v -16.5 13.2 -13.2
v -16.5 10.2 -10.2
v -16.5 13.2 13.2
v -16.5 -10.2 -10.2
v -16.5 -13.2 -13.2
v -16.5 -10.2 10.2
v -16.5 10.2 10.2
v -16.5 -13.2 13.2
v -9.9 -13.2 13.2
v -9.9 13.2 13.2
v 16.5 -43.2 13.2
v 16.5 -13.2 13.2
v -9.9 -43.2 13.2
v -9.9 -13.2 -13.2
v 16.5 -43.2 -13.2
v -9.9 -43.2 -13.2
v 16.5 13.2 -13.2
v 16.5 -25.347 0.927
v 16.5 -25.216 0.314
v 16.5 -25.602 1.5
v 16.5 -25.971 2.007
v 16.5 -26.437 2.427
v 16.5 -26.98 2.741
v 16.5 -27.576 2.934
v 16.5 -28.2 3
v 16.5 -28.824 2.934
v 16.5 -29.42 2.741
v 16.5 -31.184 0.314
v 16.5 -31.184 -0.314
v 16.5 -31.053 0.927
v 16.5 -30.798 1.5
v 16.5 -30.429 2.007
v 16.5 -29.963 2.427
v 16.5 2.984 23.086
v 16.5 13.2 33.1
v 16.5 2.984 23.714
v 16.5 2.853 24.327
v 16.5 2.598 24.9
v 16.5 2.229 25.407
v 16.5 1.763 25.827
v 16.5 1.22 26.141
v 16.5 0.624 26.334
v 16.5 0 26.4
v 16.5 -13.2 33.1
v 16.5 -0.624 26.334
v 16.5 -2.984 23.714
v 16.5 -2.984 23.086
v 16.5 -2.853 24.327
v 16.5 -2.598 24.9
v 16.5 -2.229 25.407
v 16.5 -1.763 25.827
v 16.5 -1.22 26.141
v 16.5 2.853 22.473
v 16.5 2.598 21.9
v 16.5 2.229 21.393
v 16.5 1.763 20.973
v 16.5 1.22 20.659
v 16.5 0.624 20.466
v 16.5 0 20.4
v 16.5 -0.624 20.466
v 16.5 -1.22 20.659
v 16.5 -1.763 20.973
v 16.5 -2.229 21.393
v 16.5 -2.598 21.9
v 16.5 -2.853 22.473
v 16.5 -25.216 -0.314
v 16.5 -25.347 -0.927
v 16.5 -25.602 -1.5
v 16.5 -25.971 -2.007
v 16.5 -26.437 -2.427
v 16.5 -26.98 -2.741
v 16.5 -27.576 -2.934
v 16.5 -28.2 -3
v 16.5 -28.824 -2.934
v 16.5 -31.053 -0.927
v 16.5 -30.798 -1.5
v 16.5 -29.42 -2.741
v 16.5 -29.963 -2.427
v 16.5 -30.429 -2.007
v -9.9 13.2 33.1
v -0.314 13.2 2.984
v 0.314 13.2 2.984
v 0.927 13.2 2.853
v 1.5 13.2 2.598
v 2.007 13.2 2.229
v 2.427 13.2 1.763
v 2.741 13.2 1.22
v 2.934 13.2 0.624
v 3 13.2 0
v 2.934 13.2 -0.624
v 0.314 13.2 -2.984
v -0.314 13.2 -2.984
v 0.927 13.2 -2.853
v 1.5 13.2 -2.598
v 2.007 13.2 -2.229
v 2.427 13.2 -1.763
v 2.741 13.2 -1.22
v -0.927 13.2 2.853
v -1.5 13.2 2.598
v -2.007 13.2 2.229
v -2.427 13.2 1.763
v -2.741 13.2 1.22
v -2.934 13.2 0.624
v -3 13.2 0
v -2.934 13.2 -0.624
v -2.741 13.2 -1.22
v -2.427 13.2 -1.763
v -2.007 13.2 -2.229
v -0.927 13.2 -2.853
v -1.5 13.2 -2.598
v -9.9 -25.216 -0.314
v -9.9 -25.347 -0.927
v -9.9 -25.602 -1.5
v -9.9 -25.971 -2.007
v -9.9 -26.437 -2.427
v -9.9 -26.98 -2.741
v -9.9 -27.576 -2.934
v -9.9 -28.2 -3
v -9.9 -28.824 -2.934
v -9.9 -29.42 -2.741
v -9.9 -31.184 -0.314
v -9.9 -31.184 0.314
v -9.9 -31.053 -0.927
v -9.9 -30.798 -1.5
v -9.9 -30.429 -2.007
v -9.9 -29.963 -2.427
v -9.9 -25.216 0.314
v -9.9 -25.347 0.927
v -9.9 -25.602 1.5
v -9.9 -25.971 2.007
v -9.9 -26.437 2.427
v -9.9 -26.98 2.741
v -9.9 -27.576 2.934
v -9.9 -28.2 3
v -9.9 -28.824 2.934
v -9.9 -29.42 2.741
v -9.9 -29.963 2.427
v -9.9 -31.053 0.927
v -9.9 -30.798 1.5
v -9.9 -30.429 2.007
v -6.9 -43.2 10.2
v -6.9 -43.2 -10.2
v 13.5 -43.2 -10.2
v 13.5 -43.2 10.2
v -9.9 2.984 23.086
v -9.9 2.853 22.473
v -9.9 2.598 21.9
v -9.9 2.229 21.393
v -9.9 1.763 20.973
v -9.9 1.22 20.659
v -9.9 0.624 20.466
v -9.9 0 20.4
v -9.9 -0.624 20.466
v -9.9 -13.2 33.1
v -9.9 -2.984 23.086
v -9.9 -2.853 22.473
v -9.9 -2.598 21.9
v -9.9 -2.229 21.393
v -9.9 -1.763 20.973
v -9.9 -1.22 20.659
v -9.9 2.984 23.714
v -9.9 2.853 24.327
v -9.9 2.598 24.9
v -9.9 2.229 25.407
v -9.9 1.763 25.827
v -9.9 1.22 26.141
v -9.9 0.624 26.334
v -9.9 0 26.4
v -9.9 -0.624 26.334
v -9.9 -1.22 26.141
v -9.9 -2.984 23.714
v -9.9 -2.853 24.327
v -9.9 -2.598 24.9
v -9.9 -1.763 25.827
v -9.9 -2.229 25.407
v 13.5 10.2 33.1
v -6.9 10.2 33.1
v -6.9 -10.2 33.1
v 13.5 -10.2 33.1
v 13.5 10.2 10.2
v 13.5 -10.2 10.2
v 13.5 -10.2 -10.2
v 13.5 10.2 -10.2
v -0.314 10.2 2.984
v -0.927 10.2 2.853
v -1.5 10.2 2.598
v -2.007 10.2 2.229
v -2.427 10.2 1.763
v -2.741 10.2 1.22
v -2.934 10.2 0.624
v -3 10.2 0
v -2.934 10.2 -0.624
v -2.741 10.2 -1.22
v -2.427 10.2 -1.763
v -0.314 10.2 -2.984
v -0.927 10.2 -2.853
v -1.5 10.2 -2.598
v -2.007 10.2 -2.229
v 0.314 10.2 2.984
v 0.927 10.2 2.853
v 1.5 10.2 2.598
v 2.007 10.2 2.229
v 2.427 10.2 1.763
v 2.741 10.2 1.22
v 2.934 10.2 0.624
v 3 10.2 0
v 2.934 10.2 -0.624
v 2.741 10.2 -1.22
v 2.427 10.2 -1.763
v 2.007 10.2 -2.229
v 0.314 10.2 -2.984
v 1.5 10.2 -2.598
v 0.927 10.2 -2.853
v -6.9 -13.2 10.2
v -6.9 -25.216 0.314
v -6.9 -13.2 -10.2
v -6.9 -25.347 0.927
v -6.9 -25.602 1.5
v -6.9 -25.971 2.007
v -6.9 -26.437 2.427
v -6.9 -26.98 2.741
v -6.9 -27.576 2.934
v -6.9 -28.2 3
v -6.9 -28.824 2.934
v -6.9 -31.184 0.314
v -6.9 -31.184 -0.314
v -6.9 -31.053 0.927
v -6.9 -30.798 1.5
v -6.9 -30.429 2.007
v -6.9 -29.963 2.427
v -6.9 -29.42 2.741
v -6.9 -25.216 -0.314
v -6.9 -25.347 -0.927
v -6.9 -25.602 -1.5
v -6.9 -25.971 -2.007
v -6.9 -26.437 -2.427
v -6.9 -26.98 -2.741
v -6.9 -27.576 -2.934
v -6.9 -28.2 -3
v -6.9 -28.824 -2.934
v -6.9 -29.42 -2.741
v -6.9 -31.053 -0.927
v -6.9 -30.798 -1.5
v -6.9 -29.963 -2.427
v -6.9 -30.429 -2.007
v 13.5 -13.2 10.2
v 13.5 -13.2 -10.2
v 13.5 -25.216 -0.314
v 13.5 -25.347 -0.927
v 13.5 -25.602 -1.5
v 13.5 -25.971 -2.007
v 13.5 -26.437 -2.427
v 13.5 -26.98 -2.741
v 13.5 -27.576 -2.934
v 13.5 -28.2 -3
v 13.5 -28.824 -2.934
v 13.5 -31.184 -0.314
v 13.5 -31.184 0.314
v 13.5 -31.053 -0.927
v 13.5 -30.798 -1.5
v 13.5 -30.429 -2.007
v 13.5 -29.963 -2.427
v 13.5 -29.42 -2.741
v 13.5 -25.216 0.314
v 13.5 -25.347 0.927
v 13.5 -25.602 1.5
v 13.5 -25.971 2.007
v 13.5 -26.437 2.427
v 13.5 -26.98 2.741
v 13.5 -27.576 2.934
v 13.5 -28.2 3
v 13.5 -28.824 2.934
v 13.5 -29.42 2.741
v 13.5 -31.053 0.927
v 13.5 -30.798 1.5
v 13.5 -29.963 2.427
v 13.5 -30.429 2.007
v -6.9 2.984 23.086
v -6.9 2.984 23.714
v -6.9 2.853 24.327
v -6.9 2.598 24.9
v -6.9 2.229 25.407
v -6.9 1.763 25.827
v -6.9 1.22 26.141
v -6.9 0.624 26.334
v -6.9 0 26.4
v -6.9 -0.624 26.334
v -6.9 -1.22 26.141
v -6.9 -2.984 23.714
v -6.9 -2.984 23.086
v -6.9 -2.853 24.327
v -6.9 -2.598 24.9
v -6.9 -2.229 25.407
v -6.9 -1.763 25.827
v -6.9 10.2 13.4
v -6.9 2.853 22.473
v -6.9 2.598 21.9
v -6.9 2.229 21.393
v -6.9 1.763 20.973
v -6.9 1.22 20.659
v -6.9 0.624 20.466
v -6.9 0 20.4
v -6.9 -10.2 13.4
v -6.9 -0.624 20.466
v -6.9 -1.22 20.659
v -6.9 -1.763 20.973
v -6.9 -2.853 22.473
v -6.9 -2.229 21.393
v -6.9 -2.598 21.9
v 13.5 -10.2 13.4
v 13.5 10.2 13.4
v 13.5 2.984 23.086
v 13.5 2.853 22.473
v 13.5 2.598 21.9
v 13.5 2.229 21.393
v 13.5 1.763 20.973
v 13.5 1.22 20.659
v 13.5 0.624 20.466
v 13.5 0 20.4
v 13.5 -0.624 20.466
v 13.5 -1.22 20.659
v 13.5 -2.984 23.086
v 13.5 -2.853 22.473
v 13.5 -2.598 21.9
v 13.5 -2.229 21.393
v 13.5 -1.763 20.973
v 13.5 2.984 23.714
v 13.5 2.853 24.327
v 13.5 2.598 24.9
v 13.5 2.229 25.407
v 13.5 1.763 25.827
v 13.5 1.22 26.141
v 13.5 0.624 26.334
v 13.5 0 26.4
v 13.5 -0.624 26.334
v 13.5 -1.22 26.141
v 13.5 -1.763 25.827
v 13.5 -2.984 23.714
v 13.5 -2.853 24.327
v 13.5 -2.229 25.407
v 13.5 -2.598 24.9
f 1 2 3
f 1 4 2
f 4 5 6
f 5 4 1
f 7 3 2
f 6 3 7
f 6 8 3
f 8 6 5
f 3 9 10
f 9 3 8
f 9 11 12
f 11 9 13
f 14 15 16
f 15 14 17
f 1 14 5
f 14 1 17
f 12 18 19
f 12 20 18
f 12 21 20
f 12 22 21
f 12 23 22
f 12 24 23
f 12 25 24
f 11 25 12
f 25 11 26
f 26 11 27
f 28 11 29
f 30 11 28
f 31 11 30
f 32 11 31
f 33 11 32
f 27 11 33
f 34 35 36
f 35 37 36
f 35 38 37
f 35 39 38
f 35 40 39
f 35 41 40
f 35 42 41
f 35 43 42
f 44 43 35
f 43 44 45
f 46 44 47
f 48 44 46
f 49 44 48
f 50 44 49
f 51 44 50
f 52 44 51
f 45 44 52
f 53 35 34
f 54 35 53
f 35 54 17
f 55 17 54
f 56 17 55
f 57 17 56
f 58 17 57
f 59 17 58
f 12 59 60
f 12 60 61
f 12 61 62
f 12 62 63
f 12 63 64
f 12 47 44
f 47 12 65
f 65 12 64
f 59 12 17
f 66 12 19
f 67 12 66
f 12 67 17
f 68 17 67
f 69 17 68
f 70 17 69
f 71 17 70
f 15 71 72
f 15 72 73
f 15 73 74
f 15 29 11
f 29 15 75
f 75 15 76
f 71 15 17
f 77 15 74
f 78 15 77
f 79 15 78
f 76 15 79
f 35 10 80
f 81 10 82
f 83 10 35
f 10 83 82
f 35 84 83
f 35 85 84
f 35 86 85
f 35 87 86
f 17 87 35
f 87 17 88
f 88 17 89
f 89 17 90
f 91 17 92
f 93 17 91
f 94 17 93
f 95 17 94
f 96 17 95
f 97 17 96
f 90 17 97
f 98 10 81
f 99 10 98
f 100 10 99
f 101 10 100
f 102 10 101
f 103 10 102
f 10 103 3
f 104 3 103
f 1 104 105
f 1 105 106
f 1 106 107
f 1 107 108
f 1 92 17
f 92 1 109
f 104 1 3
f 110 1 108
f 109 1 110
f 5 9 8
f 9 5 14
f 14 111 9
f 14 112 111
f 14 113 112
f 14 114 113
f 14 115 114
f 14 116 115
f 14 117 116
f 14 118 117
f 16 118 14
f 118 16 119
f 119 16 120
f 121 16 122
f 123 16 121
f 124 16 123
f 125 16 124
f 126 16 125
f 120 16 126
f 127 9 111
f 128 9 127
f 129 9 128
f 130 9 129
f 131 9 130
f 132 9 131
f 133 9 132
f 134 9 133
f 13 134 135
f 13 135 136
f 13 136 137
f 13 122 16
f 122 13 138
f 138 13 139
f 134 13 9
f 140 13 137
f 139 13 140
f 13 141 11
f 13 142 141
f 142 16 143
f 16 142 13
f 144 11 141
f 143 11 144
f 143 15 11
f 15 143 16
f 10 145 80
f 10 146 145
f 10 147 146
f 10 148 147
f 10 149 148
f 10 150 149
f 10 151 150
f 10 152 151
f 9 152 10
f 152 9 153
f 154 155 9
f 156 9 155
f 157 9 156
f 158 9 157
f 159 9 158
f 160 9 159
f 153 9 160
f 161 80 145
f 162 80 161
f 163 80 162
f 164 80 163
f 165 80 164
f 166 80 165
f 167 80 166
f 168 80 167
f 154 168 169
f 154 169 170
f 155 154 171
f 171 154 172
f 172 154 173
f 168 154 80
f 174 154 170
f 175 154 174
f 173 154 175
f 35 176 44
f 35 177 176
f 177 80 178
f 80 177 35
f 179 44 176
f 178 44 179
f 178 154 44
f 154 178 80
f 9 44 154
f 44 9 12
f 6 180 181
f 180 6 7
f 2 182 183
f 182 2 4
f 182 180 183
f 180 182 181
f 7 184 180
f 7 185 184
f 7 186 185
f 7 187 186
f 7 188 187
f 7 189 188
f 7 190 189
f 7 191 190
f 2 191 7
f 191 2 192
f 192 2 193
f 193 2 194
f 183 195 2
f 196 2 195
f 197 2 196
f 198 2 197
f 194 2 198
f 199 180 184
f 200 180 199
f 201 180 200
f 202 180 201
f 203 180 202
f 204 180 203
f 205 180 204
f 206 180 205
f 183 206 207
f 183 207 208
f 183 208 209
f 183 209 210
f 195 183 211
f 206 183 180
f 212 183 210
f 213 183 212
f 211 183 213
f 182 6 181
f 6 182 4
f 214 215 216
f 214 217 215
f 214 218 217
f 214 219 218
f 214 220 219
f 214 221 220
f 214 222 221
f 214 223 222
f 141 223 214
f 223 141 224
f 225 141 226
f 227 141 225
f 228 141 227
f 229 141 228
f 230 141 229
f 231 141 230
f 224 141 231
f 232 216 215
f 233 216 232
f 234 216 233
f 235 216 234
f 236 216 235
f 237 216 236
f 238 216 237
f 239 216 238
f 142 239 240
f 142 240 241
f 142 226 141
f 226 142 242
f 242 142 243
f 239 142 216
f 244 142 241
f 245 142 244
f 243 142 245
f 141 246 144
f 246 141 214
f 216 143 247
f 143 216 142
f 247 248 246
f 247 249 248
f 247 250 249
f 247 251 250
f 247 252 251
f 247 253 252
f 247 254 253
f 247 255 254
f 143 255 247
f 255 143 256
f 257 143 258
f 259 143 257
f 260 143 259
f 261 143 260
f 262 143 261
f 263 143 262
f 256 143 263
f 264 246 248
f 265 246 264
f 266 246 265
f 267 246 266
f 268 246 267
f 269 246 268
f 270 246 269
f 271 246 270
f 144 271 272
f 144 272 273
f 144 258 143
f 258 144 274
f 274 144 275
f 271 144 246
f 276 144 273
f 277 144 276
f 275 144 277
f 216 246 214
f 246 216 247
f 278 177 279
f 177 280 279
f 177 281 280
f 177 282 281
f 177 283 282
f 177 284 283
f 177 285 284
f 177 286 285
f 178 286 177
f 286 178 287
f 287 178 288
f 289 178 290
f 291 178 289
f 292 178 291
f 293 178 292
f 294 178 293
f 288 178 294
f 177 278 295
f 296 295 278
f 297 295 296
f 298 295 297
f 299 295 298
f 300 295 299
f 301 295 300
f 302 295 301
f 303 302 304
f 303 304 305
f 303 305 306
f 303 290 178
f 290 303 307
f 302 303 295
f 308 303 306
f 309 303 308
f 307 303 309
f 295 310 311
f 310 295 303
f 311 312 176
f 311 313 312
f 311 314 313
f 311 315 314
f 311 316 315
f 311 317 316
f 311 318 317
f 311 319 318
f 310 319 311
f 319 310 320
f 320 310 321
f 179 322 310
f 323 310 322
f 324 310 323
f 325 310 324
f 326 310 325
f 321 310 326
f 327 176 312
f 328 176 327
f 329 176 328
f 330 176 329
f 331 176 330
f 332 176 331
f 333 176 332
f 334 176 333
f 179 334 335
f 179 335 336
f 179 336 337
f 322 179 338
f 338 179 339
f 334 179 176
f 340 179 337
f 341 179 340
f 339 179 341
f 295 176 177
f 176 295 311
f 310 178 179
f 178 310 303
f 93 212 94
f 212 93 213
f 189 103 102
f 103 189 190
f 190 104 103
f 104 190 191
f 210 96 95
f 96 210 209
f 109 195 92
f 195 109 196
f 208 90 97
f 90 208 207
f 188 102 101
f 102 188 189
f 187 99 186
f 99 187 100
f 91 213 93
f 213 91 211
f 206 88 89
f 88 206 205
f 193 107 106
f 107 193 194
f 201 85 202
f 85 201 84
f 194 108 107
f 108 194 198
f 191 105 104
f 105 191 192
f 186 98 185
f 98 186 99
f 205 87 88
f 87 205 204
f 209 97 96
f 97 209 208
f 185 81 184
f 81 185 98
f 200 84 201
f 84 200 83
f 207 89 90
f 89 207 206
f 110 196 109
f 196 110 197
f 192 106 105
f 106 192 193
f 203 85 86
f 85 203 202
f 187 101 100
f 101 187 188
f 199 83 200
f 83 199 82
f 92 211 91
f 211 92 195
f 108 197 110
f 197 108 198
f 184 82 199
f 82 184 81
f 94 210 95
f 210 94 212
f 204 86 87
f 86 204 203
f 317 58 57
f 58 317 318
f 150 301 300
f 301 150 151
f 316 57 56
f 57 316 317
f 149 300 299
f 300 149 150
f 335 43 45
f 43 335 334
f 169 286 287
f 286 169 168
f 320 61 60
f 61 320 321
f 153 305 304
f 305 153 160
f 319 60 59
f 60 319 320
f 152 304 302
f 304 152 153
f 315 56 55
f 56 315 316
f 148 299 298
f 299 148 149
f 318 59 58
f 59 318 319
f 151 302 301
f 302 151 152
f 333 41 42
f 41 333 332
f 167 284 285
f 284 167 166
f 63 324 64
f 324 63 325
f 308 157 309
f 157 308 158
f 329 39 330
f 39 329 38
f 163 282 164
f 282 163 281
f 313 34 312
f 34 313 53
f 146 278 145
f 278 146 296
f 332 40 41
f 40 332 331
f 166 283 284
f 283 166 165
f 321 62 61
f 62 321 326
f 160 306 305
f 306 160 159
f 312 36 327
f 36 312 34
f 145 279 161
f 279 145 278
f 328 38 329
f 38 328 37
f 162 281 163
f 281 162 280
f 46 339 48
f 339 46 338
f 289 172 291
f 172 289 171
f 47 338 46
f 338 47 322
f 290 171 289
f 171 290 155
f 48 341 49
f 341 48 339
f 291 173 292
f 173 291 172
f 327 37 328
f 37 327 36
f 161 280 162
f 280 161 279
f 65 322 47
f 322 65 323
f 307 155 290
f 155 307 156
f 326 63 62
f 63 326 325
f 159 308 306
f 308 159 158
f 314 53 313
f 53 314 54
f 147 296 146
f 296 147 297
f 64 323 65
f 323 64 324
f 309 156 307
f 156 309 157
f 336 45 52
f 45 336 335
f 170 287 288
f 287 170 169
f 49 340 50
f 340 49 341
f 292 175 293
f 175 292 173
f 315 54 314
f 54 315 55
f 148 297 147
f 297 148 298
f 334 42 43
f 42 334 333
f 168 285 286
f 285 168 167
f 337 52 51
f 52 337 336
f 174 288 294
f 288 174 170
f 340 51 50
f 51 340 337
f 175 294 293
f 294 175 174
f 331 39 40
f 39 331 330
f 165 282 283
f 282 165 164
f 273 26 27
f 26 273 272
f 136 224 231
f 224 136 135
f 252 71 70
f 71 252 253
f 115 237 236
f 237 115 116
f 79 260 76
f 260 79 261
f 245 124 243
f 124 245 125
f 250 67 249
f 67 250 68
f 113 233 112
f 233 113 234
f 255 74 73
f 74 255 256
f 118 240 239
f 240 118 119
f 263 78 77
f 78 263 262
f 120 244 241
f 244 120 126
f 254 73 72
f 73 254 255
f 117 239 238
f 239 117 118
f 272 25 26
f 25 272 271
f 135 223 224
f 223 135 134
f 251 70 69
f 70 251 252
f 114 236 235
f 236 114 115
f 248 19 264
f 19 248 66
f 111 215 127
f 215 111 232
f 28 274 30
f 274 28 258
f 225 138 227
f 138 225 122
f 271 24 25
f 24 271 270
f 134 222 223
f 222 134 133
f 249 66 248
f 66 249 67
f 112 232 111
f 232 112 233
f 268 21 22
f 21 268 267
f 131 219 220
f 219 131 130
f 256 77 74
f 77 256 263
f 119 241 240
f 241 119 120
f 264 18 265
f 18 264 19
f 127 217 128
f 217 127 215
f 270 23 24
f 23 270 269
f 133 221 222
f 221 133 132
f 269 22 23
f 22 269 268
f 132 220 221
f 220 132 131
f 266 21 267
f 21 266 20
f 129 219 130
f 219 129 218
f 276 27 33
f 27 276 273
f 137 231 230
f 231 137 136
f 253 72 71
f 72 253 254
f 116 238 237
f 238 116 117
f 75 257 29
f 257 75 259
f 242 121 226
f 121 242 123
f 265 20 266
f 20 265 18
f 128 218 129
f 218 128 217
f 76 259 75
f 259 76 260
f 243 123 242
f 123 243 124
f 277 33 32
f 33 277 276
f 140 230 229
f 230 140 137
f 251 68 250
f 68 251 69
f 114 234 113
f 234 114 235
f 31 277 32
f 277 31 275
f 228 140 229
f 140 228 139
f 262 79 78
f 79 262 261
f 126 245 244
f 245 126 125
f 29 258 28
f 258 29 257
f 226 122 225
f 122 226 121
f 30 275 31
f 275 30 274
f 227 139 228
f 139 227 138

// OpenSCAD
dim = 20.4;
thick = 3;

len1 = 30;
len2 = 30;
len3 = 20;

mirror()
difference() {
	union() {
		cube([len1+thick, dim+thick*2, dim+thick*2], true);
		translate([-len1/2+dim/2+thick*0.5, -len2/2-dim/2-thick, 0])
			cube([dim+thick*2, len2, dim+thick*2], true);
		translate([dim/2-len1/2+thick*0.5, 0, dim+thick-0.3])
			cube([dim+thick*2, dim+thick*2, len3], true);
	}

	translate([thick, 0, 0])
		cube([len1+thick, dim, dim], true);
	translate([-len1/2+dim/2+thick*0.5, -len2/2-thick/2-dim/2-thick, 0])
		cube([dim, len2+thick, dim], true);
	translate([dim/2-len1/2+thick*0.5, 0, dim+thick+thick/2])
		cube([dim, dim, len3+thick], true);

	translate([0, 25, 0])
		rotate([90, 0, 0])
			cylinder(r=3, h=50, center=true, $fn=30);
	translate([0, 0, dim+thick])
		rotate([0, 90, 0])
			cylinder(r=3, h=50, center=true, $fn=30);
	translate([0, -dim/2-thick-len2/2, 0])
		rotate([0, 90, 0])
			cylinder(r=3, h=50, center=true, $fn=30);
}
